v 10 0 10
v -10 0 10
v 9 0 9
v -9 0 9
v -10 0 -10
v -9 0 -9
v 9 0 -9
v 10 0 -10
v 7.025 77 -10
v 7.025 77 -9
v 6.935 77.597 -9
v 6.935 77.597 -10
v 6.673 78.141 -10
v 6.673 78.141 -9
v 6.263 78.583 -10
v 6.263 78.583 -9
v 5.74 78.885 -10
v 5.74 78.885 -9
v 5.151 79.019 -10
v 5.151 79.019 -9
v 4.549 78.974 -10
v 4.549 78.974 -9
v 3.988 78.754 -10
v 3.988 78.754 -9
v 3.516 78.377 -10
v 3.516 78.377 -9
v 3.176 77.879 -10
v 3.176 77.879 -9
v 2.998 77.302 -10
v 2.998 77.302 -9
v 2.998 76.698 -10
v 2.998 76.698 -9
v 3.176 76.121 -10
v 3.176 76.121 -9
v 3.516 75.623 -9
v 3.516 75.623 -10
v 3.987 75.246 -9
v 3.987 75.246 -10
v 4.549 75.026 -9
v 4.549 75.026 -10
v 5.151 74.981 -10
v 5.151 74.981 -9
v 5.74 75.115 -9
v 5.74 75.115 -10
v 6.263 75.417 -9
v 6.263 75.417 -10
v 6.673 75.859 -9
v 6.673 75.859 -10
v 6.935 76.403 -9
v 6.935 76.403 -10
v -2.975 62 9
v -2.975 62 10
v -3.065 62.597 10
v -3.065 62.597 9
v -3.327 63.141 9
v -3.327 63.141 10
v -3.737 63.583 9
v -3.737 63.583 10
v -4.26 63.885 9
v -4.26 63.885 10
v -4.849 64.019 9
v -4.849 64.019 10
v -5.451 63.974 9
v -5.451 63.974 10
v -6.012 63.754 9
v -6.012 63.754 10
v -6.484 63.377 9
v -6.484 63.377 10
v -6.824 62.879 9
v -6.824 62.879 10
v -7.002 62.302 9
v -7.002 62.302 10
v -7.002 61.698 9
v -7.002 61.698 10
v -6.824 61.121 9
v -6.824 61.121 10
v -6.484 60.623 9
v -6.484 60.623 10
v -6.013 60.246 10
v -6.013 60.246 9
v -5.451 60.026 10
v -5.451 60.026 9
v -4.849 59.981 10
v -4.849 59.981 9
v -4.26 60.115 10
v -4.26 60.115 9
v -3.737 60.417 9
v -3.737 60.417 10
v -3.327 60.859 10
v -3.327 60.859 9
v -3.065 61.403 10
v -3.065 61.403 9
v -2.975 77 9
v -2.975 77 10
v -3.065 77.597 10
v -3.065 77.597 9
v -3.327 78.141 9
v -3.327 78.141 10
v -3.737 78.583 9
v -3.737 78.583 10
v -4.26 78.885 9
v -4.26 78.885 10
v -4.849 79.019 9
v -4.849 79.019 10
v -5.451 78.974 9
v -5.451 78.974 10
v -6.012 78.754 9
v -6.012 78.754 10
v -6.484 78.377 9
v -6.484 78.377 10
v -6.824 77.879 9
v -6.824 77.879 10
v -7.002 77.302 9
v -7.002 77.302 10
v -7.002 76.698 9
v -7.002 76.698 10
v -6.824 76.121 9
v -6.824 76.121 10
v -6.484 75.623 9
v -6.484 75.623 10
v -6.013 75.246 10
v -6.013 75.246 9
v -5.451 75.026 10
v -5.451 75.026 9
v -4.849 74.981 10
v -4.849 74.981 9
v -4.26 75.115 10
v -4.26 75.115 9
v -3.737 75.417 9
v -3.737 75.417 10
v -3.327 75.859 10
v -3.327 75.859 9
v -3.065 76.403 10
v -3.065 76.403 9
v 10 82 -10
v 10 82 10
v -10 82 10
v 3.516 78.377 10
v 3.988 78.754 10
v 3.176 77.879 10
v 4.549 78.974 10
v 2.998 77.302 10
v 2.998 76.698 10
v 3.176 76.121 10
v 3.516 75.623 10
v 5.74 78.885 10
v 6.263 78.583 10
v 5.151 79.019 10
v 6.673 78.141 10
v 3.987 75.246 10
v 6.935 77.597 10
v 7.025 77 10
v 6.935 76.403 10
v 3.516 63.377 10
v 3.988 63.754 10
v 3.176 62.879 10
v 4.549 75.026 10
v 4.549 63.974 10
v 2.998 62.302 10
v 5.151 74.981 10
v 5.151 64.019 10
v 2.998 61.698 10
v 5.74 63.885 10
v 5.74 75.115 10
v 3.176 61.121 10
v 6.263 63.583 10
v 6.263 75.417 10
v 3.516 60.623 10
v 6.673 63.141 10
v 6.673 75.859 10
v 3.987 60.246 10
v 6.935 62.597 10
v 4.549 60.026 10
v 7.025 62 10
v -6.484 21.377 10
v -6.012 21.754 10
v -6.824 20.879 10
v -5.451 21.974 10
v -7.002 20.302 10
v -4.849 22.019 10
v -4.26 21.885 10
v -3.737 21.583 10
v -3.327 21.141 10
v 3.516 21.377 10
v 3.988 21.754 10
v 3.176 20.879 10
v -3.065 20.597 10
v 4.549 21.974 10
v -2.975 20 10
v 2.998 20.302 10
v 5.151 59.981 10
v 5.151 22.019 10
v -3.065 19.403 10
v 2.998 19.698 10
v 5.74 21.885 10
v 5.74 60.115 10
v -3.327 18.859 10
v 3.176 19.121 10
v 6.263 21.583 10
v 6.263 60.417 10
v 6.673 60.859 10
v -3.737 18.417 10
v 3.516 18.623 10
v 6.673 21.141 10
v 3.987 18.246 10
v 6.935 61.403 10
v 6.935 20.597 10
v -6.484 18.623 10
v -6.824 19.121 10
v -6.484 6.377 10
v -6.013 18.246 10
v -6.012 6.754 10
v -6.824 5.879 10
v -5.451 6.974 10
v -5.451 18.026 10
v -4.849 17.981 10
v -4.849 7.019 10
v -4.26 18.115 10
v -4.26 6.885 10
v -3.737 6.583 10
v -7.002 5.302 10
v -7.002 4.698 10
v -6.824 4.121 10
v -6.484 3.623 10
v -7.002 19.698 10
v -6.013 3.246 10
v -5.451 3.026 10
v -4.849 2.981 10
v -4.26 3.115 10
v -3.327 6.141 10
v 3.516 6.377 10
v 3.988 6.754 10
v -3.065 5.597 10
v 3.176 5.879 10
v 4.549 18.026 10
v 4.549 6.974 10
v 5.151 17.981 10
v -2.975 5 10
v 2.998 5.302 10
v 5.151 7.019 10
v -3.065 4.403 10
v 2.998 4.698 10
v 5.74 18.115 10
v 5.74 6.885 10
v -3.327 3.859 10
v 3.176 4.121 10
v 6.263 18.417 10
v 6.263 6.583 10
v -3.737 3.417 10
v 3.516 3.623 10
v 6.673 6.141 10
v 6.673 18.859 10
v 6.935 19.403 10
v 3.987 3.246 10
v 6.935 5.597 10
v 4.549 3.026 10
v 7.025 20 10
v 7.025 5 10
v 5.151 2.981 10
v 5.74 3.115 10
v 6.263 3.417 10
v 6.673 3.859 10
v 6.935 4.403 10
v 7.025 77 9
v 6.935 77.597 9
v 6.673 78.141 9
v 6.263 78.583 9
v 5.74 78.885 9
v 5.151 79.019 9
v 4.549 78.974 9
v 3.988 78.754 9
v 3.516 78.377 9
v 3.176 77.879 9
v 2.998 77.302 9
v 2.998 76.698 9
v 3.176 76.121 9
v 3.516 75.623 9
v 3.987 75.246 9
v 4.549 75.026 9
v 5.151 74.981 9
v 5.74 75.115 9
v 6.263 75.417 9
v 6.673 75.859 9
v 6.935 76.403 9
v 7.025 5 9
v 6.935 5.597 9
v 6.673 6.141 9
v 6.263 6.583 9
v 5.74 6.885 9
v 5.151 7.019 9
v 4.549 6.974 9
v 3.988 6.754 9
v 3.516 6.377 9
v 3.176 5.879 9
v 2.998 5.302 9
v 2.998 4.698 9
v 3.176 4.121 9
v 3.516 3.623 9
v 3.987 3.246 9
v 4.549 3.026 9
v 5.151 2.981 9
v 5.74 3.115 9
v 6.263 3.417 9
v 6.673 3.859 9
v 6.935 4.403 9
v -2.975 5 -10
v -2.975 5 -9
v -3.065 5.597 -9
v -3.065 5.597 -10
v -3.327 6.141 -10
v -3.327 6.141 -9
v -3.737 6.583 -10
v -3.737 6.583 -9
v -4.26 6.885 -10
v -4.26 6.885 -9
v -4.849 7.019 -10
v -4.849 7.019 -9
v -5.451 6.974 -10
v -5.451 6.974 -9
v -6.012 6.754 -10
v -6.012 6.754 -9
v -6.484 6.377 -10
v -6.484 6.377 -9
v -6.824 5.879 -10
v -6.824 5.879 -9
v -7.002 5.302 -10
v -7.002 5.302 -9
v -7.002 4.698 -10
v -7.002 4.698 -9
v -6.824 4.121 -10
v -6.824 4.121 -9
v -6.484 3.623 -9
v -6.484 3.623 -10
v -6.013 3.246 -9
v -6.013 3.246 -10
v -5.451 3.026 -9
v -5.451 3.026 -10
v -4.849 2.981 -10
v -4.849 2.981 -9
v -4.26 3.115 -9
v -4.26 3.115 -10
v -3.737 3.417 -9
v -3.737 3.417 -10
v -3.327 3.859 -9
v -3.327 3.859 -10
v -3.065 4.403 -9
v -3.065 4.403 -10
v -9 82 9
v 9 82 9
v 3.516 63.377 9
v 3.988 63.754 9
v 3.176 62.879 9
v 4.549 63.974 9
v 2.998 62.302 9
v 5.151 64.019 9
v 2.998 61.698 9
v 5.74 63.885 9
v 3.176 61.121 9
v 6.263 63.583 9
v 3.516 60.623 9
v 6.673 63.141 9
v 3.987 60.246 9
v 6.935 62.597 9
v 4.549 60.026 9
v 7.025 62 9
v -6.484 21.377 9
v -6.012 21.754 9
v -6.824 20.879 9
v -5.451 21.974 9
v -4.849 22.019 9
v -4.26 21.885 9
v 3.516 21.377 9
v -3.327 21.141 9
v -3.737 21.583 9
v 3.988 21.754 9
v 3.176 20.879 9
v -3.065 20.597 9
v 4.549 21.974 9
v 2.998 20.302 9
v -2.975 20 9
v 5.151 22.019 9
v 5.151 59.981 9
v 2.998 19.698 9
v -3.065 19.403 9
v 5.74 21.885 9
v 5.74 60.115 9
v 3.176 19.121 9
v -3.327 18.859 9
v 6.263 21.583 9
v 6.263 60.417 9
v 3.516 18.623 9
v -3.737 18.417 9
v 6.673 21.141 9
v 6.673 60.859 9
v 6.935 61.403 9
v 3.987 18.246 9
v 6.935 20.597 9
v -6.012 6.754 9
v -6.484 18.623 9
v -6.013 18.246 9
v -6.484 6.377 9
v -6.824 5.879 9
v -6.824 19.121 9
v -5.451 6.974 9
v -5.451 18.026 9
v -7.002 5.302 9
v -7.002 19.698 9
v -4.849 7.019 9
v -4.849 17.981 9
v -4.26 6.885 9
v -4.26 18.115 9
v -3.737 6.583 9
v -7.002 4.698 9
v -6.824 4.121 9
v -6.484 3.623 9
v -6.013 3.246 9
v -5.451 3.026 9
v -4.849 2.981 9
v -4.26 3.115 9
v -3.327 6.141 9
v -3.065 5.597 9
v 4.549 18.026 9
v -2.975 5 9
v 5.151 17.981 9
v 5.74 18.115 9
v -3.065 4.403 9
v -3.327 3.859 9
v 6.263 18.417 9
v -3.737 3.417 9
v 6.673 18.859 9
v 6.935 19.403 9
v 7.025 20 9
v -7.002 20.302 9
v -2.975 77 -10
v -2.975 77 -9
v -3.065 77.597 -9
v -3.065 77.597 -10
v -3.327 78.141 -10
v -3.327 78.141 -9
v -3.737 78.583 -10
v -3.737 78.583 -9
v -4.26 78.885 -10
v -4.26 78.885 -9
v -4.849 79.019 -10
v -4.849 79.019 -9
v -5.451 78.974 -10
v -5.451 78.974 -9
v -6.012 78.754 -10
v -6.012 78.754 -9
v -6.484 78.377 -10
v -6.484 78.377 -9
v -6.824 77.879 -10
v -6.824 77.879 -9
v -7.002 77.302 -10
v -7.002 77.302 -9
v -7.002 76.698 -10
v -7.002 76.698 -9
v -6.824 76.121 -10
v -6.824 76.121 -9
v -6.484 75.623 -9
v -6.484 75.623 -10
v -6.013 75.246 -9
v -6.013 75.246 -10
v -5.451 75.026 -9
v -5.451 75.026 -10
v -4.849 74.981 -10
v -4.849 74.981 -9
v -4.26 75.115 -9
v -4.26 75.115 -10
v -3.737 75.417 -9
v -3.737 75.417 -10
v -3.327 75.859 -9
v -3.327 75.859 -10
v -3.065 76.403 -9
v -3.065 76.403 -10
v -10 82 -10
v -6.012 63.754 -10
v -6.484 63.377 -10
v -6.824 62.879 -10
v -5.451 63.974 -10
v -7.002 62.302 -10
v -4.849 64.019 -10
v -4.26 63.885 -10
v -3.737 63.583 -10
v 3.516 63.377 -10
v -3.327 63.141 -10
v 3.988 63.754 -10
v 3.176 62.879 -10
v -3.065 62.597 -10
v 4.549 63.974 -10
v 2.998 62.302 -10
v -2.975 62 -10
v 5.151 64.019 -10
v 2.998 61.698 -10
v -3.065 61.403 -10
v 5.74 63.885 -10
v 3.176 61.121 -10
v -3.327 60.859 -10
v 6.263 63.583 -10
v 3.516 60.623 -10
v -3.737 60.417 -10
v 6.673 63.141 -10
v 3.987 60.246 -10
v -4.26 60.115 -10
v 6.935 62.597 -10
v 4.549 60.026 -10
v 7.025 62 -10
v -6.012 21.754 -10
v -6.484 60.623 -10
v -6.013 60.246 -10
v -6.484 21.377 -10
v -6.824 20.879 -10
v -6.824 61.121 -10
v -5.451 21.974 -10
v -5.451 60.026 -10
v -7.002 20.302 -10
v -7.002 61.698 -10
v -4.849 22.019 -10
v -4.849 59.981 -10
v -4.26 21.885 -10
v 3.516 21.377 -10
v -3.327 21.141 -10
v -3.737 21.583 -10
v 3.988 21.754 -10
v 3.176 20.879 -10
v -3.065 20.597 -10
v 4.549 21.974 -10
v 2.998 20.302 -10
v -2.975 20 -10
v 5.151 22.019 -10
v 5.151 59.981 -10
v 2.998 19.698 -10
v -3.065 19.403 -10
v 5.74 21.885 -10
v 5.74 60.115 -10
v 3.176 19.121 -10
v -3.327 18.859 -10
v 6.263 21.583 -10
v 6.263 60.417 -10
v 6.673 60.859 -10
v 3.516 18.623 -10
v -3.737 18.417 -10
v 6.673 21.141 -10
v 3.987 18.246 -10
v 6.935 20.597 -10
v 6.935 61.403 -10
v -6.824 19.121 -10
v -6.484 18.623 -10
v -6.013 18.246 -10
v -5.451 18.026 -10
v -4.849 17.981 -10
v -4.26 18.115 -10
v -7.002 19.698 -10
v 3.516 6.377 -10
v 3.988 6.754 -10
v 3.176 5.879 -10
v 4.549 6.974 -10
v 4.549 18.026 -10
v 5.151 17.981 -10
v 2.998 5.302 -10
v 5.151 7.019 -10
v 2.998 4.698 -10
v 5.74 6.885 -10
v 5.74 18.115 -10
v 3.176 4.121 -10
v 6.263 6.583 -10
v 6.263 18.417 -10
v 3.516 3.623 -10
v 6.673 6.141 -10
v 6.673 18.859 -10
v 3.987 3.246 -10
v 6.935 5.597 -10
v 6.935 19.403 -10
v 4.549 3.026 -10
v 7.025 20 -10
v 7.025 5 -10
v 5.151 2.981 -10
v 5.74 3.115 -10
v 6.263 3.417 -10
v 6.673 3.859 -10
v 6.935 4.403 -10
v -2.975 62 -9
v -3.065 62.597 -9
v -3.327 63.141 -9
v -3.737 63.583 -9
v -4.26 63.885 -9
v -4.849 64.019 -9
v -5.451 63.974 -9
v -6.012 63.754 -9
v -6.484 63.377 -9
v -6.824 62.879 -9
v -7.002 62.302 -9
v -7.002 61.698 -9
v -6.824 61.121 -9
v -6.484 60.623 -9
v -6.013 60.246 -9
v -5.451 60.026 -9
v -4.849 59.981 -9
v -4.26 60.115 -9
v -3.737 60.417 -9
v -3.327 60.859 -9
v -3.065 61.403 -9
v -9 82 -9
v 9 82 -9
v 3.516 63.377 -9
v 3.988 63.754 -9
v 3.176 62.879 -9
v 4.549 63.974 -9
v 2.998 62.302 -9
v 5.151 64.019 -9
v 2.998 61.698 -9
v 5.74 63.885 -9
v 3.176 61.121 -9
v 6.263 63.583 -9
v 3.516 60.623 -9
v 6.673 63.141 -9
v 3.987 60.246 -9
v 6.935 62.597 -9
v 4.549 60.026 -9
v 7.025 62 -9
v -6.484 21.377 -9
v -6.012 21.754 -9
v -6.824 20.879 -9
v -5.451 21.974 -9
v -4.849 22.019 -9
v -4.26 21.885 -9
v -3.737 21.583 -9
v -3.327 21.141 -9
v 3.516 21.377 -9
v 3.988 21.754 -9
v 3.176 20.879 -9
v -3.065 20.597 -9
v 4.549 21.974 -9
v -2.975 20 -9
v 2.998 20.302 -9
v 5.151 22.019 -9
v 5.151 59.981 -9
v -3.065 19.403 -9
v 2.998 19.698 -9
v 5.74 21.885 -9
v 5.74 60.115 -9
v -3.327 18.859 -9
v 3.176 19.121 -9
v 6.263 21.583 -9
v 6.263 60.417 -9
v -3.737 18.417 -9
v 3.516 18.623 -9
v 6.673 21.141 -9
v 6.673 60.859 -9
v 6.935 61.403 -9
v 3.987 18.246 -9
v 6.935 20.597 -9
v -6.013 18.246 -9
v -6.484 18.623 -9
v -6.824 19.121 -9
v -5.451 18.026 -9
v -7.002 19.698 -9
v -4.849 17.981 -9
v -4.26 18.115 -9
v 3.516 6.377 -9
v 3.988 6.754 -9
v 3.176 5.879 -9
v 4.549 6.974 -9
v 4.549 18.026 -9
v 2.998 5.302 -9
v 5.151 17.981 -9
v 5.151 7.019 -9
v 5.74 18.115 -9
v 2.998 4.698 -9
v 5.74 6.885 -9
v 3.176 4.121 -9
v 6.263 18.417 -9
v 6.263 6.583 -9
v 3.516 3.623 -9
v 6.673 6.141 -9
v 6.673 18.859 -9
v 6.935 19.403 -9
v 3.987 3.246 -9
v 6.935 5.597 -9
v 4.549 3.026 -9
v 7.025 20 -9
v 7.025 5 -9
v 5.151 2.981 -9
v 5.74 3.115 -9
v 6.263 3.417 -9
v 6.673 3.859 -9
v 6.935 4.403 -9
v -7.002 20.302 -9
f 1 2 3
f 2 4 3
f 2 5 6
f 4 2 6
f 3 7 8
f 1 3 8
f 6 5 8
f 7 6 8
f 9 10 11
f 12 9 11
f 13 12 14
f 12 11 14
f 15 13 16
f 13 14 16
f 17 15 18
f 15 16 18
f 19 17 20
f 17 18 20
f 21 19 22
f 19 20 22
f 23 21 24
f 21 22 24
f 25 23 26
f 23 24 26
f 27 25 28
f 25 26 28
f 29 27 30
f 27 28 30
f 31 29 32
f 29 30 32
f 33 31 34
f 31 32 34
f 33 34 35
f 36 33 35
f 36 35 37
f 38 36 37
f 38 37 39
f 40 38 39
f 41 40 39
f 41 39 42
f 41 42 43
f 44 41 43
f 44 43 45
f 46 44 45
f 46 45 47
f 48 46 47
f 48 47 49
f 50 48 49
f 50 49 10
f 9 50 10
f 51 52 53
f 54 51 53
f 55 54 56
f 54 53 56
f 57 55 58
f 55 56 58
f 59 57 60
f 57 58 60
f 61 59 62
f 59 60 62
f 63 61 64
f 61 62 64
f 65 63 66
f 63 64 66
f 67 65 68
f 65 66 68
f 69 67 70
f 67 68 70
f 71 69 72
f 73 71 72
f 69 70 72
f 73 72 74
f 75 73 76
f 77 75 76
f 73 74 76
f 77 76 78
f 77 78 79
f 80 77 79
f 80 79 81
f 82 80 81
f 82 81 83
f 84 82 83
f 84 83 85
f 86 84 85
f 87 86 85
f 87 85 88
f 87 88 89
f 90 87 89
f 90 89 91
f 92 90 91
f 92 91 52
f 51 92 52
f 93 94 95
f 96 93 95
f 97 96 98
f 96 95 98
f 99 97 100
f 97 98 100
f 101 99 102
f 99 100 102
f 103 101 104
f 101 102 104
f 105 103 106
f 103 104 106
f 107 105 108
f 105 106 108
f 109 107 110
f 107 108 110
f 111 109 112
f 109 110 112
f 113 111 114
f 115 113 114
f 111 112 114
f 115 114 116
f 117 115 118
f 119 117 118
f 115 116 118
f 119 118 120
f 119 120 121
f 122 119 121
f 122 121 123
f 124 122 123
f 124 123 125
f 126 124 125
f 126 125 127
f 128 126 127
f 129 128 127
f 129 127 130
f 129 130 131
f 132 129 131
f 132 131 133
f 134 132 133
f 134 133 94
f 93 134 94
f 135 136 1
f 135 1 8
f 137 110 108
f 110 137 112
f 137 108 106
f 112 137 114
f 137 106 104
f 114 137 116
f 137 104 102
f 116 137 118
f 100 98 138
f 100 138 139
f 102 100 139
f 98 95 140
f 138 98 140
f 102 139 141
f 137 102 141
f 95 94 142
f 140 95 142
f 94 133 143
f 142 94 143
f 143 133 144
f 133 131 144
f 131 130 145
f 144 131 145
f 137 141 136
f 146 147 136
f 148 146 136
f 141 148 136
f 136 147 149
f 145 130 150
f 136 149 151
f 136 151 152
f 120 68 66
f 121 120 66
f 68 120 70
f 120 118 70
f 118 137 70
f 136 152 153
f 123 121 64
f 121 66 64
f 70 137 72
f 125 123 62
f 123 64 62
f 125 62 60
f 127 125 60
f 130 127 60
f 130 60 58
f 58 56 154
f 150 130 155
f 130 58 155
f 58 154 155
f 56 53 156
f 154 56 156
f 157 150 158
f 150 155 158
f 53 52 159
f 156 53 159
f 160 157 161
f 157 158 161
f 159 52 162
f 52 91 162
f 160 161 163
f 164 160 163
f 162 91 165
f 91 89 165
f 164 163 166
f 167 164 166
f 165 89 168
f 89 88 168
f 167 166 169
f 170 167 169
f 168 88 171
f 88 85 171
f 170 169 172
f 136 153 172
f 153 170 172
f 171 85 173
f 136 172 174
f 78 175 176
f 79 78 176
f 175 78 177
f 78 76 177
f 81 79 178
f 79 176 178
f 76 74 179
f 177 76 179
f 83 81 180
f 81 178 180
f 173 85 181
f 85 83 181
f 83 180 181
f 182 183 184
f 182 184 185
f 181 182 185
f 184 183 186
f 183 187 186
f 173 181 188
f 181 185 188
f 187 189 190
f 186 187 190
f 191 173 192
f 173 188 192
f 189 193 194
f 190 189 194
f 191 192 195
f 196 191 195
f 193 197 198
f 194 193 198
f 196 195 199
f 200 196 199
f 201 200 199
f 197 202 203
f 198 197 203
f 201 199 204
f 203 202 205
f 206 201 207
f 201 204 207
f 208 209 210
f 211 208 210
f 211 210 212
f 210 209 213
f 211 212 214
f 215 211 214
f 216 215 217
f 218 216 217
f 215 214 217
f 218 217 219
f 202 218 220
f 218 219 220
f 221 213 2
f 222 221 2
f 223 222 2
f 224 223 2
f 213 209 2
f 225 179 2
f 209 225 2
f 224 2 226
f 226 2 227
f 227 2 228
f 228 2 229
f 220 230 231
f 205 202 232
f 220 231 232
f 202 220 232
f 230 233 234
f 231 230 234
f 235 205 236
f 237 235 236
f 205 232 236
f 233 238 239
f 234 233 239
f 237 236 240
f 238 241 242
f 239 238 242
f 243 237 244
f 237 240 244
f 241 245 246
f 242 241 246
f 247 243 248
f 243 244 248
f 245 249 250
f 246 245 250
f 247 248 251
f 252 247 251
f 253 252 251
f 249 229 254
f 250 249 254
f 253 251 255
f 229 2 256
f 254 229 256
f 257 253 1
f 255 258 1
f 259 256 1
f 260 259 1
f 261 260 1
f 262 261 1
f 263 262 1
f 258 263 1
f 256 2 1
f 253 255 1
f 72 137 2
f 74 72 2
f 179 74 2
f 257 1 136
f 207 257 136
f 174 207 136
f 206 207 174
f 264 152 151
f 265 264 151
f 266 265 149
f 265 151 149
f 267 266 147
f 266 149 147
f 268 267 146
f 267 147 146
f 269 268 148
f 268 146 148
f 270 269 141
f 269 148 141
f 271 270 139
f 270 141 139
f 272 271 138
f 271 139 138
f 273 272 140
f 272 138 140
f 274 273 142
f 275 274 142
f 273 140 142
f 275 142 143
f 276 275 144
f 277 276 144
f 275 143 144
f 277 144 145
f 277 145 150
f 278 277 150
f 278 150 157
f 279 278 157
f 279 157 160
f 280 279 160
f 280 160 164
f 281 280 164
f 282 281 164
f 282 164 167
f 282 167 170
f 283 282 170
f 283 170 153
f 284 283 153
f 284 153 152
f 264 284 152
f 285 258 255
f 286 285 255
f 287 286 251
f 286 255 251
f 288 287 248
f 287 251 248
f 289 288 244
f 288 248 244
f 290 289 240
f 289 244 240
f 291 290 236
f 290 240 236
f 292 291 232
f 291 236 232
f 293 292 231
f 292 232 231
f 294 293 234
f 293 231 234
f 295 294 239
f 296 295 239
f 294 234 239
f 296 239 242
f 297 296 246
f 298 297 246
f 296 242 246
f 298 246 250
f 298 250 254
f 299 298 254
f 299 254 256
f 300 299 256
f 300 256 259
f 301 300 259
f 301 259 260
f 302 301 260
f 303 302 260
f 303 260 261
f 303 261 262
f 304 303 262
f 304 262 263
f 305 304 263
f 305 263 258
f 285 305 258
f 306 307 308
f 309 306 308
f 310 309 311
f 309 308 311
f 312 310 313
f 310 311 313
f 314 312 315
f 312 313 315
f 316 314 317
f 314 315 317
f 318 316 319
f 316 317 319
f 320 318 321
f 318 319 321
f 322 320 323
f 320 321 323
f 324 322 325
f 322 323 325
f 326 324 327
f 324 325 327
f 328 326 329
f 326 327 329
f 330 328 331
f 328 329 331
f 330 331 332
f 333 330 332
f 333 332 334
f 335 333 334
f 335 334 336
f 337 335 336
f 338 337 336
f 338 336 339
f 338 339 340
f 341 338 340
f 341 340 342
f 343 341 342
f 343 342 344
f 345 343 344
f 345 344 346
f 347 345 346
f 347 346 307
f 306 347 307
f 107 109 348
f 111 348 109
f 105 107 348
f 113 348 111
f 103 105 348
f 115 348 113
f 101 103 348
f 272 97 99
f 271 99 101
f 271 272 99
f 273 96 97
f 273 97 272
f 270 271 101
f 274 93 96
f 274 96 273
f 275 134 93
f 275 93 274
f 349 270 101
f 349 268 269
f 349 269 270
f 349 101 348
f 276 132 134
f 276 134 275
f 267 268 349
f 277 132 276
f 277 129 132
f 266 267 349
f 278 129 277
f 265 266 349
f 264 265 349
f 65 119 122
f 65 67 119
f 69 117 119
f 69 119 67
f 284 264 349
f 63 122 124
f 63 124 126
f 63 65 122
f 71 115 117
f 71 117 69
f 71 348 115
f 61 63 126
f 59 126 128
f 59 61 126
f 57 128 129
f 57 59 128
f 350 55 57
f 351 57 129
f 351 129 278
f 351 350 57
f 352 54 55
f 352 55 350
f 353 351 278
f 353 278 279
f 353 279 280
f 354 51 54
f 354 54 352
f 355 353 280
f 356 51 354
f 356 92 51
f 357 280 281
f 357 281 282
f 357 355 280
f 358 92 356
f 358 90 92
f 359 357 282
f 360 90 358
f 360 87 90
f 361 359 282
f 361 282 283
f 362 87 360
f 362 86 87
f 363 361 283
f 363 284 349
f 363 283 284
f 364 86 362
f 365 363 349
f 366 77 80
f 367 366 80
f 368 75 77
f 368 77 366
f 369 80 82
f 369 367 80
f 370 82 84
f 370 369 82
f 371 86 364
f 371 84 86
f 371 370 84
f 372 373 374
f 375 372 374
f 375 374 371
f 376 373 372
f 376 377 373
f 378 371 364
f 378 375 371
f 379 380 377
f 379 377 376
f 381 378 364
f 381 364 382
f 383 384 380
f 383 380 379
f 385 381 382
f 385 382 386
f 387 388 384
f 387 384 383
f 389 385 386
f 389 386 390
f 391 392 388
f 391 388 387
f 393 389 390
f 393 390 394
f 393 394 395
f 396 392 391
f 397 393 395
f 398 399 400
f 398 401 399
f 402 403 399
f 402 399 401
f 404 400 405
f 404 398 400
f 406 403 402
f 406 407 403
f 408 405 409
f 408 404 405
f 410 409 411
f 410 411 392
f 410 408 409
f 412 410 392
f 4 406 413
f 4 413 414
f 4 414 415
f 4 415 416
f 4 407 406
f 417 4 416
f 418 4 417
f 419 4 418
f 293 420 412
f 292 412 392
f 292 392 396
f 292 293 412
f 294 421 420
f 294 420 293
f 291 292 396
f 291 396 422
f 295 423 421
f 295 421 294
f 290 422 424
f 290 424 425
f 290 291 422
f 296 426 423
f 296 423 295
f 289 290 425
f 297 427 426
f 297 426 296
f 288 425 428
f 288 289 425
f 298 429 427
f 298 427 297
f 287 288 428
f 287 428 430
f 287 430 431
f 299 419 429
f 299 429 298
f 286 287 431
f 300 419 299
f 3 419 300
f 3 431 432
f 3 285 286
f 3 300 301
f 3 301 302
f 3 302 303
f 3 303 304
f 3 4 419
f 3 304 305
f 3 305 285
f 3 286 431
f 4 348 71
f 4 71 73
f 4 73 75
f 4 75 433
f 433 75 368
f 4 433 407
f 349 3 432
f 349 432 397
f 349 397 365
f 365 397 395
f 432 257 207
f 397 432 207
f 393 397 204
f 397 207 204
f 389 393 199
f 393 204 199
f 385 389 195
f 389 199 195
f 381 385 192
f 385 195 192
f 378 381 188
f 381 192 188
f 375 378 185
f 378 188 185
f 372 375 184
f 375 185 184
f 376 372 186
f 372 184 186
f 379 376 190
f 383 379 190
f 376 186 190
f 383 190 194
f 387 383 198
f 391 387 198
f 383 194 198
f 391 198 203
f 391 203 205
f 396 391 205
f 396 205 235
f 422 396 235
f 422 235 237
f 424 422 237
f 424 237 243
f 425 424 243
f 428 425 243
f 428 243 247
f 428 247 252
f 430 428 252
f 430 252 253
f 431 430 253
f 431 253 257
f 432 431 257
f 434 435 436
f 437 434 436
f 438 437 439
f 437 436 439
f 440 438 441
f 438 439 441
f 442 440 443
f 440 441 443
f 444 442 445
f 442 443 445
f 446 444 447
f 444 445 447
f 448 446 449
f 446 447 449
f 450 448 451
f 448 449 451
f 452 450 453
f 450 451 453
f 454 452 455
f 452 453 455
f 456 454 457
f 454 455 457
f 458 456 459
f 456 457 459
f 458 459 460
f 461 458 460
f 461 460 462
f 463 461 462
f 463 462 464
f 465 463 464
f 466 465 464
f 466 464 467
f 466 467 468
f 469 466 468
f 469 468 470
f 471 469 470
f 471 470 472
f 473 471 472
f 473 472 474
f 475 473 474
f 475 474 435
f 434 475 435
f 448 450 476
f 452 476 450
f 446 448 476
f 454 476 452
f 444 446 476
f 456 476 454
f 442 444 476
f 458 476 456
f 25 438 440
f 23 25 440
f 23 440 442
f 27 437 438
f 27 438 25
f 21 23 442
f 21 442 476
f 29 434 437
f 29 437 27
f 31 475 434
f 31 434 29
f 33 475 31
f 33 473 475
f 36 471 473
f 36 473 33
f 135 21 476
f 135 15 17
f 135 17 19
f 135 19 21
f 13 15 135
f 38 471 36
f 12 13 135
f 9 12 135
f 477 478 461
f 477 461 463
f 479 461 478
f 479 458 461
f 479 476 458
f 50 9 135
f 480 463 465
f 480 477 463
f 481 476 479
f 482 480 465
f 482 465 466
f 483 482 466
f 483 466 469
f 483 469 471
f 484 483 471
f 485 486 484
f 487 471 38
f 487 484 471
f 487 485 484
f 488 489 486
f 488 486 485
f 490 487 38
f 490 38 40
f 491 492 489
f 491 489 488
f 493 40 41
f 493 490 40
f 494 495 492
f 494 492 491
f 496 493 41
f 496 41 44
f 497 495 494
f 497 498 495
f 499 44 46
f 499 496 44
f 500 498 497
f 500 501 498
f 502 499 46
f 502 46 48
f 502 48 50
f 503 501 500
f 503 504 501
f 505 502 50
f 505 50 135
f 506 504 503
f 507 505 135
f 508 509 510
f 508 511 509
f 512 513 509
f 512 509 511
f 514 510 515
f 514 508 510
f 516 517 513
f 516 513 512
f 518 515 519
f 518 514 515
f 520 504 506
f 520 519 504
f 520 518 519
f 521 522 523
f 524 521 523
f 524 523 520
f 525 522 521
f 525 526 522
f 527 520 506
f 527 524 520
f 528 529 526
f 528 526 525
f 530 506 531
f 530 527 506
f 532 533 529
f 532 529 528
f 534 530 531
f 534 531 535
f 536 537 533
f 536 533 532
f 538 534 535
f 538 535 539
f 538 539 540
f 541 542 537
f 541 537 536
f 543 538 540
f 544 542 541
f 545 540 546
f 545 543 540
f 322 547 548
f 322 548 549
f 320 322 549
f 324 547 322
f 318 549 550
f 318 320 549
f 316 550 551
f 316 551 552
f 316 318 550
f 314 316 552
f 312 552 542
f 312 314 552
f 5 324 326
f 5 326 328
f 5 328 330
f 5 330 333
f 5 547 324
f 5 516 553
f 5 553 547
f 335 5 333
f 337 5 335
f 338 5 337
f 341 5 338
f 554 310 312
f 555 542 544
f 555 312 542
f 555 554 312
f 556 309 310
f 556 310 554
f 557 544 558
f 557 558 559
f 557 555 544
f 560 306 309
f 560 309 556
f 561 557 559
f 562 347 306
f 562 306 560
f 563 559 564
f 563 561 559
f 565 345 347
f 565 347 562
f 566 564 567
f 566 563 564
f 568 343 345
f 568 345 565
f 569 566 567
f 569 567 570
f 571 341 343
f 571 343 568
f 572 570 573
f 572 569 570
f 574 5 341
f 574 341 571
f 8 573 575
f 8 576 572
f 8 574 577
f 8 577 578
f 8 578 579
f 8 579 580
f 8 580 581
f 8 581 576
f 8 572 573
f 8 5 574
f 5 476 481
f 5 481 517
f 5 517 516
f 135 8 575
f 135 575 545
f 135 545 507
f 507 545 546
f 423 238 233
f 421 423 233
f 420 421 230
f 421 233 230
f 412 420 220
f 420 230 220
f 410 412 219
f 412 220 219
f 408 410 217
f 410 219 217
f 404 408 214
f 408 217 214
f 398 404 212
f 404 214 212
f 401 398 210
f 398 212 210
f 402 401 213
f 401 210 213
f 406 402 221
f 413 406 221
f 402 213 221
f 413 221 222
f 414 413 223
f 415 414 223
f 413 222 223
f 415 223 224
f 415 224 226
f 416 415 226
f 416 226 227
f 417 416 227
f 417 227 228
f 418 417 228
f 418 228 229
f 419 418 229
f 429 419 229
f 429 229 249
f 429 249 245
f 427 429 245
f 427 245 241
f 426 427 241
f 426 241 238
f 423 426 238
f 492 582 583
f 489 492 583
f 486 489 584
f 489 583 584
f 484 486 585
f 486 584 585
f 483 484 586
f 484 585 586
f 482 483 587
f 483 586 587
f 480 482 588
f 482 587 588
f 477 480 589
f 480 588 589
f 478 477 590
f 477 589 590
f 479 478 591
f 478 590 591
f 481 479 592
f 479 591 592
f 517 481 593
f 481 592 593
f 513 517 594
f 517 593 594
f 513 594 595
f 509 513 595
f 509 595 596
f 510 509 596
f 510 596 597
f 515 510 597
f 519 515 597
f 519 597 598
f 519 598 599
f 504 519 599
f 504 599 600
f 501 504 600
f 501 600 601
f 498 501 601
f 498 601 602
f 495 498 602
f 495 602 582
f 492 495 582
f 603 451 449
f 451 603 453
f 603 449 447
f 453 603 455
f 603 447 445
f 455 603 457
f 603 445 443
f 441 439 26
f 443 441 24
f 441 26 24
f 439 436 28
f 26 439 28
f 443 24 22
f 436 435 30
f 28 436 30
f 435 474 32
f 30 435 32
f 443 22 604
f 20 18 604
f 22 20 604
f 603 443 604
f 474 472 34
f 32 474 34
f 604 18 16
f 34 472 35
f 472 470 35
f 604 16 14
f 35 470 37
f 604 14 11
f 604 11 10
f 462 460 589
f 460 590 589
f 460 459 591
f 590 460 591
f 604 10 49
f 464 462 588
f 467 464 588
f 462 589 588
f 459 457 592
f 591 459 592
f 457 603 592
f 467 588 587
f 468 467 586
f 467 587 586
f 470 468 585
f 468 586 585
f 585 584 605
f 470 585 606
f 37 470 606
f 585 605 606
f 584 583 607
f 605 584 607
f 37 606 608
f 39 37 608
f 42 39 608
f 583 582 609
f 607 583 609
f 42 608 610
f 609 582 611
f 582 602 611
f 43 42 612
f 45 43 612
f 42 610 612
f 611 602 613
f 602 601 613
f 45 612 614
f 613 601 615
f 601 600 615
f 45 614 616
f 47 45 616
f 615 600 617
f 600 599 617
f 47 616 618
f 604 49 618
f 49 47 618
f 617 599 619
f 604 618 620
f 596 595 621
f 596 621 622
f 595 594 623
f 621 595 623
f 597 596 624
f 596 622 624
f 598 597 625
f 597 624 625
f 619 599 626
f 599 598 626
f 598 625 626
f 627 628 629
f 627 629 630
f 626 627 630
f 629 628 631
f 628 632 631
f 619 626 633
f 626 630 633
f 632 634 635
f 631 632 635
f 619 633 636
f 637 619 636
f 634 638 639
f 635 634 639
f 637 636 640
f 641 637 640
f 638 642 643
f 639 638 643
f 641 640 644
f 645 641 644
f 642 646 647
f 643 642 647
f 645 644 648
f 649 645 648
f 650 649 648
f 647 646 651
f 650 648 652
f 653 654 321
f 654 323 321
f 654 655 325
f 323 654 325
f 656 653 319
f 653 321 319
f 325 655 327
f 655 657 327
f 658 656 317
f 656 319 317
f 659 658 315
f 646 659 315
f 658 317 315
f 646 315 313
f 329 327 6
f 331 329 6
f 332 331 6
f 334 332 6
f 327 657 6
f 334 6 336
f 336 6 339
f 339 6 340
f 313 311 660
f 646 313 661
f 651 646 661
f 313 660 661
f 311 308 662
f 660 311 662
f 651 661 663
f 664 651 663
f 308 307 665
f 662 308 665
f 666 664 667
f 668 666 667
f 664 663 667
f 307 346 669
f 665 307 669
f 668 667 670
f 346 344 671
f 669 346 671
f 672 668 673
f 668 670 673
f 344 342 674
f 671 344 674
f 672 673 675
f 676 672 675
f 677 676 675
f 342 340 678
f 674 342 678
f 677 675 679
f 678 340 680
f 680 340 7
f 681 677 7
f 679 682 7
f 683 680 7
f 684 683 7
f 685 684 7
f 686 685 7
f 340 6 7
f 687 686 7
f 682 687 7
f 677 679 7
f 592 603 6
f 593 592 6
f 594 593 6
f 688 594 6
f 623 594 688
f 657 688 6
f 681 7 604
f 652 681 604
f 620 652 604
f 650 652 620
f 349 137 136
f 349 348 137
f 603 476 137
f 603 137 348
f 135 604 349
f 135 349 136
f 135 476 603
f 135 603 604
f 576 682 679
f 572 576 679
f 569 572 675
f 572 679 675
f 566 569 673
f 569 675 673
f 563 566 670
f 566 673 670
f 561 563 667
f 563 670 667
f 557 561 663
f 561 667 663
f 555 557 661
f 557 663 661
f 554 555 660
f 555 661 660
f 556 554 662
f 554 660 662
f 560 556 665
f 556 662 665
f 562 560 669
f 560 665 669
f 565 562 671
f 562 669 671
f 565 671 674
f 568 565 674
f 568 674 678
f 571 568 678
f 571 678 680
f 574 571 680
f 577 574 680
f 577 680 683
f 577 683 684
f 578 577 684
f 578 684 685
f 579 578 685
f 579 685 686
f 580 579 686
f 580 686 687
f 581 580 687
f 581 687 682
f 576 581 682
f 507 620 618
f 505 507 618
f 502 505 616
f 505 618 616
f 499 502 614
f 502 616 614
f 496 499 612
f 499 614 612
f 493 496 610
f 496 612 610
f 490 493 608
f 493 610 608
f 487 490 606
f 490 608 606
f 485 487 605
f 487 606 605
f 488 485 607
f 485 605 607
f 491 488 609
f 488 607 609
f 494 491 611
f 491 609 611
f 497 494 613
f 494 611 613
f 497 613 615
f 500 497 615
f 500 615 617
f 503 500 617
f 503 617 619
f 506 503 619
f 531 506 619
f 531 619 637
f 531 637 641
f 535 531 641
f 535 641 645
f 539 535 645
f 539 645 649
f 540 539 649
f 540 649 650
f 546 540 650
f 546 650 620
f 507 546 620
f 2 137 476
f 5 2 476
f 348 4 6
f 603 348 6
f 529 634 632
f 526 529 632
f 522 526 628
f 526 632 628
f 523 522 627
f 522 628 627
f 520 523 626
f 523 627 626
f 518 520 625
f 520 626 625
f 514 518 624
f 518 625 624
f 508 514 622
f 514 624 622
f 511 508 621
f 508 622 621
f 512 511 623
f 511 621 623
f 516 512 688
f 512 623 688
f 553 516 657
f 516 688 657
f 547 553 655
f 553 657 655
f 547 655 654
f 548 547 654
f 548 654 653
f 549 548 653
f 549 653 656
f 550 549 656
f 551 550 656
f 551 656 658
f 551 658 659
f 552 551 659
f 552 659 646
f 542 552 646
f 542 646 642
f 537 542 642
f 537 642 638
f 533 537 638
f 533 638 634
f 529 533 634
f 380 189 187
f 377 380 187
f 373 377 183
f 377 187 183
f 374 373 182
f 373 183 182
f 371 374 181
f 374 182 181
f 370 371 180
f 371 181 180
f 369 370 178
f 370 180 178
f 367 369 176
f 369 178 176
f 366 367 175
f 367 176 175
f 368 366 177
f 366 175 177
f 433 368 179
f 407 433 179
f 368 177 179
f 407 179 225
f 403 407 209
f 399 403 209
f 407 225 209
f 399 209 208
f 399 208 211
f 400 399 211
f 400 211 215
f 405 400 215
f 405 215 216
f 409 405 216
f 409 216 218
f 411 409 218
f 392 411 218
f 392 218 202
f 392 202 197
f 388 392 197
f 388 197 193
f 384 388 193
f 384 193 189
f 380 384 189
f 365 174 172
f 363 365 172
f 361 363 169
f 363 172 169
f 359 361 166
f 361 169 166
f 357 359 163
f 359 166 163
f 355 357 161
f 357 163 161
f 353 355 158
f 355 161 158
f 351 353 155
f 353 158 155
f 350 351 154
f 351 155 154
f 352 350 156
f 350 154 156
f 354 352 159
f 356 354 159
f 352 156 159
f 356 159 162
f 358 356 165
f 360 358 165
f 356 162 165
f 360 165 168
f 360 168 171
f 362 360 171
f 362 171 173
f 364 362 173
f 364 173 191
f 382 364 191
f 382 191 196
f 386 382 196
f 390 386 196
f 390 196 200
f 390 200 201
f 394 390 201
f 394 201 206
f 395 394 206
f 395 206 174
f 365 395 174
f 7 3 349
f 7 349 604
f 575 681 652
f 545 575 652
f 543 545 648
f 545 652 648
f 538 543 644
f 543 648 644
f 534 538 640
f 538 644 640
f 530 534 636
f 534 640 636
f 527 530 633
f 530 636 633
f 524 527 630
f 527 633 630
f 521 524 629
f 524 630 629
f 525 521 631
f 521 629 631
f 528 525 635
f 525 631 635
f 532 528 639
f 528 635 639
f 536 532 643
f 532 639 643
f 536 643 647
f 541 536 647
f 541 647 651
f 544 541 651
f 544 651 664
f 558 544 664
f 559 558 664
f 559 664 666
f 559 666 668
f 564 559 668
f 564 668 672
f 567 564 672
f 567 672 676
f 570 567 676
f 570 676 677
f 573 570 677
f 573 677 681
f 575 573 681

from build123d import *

# Parameters (mm, degrees)
SKETCH_1_W          = 20
SKETCH_1_H          = 20
SKETCH_1_W_2        = 18
SKETCH_1_H_2        = 18
EXTRUDE_1_DEPTH     = 82
SKETCH_2_R          = 2.025
CUT_EXTRUDE_1_DEPTH = 21


with BuildPart() as part:
    # 草图1 → 凸台-拉伸1 (new body)
    with BuildSketch(Plane(origin=(0, 0, 0), x_dir=(1, 0, 0), z_dir=(0, 1, 0))):
        Rectangle(SKETCH_1_W, SKETCH_1_H)
        Rectangle(SKETCH_1_W_2, SKETCH_1_H_2, mode=Mode.SUBTRACT)
    extrude(amount=EXTRUDE_1_DEPTH)

    # 草图2 → 切除-拉伸1 (cut, through all)
    with BuildSketch(Plane.XY.offset(10)):
        with Locations((-5, 5)):
            Circle(SKETCH_2_R)
        with Locations((-5, 20)):
            Circle(SKETCH_2_R)
        with Locations((5, 20)):
            Circle(SKETCH_2_R)
        with Locations((5, 5)):
            Circle(SKETCH_2_R)
        with Locations((5, 77)):
            Circle(SKETCH_2_R)
        with Locations((-5, 77)):
            Circle(SKETCH_2_R)
        with Locations((-5, 62)):
            Circle(SKETCH_2_R)
        with Locations((5, 62)):
            Circle(SKETCH_2_R)
    extrude(amount=-CUT_EXTRUDE_1_DEPTH, mode=Mode.SUBTRACT)


solid = part.part
